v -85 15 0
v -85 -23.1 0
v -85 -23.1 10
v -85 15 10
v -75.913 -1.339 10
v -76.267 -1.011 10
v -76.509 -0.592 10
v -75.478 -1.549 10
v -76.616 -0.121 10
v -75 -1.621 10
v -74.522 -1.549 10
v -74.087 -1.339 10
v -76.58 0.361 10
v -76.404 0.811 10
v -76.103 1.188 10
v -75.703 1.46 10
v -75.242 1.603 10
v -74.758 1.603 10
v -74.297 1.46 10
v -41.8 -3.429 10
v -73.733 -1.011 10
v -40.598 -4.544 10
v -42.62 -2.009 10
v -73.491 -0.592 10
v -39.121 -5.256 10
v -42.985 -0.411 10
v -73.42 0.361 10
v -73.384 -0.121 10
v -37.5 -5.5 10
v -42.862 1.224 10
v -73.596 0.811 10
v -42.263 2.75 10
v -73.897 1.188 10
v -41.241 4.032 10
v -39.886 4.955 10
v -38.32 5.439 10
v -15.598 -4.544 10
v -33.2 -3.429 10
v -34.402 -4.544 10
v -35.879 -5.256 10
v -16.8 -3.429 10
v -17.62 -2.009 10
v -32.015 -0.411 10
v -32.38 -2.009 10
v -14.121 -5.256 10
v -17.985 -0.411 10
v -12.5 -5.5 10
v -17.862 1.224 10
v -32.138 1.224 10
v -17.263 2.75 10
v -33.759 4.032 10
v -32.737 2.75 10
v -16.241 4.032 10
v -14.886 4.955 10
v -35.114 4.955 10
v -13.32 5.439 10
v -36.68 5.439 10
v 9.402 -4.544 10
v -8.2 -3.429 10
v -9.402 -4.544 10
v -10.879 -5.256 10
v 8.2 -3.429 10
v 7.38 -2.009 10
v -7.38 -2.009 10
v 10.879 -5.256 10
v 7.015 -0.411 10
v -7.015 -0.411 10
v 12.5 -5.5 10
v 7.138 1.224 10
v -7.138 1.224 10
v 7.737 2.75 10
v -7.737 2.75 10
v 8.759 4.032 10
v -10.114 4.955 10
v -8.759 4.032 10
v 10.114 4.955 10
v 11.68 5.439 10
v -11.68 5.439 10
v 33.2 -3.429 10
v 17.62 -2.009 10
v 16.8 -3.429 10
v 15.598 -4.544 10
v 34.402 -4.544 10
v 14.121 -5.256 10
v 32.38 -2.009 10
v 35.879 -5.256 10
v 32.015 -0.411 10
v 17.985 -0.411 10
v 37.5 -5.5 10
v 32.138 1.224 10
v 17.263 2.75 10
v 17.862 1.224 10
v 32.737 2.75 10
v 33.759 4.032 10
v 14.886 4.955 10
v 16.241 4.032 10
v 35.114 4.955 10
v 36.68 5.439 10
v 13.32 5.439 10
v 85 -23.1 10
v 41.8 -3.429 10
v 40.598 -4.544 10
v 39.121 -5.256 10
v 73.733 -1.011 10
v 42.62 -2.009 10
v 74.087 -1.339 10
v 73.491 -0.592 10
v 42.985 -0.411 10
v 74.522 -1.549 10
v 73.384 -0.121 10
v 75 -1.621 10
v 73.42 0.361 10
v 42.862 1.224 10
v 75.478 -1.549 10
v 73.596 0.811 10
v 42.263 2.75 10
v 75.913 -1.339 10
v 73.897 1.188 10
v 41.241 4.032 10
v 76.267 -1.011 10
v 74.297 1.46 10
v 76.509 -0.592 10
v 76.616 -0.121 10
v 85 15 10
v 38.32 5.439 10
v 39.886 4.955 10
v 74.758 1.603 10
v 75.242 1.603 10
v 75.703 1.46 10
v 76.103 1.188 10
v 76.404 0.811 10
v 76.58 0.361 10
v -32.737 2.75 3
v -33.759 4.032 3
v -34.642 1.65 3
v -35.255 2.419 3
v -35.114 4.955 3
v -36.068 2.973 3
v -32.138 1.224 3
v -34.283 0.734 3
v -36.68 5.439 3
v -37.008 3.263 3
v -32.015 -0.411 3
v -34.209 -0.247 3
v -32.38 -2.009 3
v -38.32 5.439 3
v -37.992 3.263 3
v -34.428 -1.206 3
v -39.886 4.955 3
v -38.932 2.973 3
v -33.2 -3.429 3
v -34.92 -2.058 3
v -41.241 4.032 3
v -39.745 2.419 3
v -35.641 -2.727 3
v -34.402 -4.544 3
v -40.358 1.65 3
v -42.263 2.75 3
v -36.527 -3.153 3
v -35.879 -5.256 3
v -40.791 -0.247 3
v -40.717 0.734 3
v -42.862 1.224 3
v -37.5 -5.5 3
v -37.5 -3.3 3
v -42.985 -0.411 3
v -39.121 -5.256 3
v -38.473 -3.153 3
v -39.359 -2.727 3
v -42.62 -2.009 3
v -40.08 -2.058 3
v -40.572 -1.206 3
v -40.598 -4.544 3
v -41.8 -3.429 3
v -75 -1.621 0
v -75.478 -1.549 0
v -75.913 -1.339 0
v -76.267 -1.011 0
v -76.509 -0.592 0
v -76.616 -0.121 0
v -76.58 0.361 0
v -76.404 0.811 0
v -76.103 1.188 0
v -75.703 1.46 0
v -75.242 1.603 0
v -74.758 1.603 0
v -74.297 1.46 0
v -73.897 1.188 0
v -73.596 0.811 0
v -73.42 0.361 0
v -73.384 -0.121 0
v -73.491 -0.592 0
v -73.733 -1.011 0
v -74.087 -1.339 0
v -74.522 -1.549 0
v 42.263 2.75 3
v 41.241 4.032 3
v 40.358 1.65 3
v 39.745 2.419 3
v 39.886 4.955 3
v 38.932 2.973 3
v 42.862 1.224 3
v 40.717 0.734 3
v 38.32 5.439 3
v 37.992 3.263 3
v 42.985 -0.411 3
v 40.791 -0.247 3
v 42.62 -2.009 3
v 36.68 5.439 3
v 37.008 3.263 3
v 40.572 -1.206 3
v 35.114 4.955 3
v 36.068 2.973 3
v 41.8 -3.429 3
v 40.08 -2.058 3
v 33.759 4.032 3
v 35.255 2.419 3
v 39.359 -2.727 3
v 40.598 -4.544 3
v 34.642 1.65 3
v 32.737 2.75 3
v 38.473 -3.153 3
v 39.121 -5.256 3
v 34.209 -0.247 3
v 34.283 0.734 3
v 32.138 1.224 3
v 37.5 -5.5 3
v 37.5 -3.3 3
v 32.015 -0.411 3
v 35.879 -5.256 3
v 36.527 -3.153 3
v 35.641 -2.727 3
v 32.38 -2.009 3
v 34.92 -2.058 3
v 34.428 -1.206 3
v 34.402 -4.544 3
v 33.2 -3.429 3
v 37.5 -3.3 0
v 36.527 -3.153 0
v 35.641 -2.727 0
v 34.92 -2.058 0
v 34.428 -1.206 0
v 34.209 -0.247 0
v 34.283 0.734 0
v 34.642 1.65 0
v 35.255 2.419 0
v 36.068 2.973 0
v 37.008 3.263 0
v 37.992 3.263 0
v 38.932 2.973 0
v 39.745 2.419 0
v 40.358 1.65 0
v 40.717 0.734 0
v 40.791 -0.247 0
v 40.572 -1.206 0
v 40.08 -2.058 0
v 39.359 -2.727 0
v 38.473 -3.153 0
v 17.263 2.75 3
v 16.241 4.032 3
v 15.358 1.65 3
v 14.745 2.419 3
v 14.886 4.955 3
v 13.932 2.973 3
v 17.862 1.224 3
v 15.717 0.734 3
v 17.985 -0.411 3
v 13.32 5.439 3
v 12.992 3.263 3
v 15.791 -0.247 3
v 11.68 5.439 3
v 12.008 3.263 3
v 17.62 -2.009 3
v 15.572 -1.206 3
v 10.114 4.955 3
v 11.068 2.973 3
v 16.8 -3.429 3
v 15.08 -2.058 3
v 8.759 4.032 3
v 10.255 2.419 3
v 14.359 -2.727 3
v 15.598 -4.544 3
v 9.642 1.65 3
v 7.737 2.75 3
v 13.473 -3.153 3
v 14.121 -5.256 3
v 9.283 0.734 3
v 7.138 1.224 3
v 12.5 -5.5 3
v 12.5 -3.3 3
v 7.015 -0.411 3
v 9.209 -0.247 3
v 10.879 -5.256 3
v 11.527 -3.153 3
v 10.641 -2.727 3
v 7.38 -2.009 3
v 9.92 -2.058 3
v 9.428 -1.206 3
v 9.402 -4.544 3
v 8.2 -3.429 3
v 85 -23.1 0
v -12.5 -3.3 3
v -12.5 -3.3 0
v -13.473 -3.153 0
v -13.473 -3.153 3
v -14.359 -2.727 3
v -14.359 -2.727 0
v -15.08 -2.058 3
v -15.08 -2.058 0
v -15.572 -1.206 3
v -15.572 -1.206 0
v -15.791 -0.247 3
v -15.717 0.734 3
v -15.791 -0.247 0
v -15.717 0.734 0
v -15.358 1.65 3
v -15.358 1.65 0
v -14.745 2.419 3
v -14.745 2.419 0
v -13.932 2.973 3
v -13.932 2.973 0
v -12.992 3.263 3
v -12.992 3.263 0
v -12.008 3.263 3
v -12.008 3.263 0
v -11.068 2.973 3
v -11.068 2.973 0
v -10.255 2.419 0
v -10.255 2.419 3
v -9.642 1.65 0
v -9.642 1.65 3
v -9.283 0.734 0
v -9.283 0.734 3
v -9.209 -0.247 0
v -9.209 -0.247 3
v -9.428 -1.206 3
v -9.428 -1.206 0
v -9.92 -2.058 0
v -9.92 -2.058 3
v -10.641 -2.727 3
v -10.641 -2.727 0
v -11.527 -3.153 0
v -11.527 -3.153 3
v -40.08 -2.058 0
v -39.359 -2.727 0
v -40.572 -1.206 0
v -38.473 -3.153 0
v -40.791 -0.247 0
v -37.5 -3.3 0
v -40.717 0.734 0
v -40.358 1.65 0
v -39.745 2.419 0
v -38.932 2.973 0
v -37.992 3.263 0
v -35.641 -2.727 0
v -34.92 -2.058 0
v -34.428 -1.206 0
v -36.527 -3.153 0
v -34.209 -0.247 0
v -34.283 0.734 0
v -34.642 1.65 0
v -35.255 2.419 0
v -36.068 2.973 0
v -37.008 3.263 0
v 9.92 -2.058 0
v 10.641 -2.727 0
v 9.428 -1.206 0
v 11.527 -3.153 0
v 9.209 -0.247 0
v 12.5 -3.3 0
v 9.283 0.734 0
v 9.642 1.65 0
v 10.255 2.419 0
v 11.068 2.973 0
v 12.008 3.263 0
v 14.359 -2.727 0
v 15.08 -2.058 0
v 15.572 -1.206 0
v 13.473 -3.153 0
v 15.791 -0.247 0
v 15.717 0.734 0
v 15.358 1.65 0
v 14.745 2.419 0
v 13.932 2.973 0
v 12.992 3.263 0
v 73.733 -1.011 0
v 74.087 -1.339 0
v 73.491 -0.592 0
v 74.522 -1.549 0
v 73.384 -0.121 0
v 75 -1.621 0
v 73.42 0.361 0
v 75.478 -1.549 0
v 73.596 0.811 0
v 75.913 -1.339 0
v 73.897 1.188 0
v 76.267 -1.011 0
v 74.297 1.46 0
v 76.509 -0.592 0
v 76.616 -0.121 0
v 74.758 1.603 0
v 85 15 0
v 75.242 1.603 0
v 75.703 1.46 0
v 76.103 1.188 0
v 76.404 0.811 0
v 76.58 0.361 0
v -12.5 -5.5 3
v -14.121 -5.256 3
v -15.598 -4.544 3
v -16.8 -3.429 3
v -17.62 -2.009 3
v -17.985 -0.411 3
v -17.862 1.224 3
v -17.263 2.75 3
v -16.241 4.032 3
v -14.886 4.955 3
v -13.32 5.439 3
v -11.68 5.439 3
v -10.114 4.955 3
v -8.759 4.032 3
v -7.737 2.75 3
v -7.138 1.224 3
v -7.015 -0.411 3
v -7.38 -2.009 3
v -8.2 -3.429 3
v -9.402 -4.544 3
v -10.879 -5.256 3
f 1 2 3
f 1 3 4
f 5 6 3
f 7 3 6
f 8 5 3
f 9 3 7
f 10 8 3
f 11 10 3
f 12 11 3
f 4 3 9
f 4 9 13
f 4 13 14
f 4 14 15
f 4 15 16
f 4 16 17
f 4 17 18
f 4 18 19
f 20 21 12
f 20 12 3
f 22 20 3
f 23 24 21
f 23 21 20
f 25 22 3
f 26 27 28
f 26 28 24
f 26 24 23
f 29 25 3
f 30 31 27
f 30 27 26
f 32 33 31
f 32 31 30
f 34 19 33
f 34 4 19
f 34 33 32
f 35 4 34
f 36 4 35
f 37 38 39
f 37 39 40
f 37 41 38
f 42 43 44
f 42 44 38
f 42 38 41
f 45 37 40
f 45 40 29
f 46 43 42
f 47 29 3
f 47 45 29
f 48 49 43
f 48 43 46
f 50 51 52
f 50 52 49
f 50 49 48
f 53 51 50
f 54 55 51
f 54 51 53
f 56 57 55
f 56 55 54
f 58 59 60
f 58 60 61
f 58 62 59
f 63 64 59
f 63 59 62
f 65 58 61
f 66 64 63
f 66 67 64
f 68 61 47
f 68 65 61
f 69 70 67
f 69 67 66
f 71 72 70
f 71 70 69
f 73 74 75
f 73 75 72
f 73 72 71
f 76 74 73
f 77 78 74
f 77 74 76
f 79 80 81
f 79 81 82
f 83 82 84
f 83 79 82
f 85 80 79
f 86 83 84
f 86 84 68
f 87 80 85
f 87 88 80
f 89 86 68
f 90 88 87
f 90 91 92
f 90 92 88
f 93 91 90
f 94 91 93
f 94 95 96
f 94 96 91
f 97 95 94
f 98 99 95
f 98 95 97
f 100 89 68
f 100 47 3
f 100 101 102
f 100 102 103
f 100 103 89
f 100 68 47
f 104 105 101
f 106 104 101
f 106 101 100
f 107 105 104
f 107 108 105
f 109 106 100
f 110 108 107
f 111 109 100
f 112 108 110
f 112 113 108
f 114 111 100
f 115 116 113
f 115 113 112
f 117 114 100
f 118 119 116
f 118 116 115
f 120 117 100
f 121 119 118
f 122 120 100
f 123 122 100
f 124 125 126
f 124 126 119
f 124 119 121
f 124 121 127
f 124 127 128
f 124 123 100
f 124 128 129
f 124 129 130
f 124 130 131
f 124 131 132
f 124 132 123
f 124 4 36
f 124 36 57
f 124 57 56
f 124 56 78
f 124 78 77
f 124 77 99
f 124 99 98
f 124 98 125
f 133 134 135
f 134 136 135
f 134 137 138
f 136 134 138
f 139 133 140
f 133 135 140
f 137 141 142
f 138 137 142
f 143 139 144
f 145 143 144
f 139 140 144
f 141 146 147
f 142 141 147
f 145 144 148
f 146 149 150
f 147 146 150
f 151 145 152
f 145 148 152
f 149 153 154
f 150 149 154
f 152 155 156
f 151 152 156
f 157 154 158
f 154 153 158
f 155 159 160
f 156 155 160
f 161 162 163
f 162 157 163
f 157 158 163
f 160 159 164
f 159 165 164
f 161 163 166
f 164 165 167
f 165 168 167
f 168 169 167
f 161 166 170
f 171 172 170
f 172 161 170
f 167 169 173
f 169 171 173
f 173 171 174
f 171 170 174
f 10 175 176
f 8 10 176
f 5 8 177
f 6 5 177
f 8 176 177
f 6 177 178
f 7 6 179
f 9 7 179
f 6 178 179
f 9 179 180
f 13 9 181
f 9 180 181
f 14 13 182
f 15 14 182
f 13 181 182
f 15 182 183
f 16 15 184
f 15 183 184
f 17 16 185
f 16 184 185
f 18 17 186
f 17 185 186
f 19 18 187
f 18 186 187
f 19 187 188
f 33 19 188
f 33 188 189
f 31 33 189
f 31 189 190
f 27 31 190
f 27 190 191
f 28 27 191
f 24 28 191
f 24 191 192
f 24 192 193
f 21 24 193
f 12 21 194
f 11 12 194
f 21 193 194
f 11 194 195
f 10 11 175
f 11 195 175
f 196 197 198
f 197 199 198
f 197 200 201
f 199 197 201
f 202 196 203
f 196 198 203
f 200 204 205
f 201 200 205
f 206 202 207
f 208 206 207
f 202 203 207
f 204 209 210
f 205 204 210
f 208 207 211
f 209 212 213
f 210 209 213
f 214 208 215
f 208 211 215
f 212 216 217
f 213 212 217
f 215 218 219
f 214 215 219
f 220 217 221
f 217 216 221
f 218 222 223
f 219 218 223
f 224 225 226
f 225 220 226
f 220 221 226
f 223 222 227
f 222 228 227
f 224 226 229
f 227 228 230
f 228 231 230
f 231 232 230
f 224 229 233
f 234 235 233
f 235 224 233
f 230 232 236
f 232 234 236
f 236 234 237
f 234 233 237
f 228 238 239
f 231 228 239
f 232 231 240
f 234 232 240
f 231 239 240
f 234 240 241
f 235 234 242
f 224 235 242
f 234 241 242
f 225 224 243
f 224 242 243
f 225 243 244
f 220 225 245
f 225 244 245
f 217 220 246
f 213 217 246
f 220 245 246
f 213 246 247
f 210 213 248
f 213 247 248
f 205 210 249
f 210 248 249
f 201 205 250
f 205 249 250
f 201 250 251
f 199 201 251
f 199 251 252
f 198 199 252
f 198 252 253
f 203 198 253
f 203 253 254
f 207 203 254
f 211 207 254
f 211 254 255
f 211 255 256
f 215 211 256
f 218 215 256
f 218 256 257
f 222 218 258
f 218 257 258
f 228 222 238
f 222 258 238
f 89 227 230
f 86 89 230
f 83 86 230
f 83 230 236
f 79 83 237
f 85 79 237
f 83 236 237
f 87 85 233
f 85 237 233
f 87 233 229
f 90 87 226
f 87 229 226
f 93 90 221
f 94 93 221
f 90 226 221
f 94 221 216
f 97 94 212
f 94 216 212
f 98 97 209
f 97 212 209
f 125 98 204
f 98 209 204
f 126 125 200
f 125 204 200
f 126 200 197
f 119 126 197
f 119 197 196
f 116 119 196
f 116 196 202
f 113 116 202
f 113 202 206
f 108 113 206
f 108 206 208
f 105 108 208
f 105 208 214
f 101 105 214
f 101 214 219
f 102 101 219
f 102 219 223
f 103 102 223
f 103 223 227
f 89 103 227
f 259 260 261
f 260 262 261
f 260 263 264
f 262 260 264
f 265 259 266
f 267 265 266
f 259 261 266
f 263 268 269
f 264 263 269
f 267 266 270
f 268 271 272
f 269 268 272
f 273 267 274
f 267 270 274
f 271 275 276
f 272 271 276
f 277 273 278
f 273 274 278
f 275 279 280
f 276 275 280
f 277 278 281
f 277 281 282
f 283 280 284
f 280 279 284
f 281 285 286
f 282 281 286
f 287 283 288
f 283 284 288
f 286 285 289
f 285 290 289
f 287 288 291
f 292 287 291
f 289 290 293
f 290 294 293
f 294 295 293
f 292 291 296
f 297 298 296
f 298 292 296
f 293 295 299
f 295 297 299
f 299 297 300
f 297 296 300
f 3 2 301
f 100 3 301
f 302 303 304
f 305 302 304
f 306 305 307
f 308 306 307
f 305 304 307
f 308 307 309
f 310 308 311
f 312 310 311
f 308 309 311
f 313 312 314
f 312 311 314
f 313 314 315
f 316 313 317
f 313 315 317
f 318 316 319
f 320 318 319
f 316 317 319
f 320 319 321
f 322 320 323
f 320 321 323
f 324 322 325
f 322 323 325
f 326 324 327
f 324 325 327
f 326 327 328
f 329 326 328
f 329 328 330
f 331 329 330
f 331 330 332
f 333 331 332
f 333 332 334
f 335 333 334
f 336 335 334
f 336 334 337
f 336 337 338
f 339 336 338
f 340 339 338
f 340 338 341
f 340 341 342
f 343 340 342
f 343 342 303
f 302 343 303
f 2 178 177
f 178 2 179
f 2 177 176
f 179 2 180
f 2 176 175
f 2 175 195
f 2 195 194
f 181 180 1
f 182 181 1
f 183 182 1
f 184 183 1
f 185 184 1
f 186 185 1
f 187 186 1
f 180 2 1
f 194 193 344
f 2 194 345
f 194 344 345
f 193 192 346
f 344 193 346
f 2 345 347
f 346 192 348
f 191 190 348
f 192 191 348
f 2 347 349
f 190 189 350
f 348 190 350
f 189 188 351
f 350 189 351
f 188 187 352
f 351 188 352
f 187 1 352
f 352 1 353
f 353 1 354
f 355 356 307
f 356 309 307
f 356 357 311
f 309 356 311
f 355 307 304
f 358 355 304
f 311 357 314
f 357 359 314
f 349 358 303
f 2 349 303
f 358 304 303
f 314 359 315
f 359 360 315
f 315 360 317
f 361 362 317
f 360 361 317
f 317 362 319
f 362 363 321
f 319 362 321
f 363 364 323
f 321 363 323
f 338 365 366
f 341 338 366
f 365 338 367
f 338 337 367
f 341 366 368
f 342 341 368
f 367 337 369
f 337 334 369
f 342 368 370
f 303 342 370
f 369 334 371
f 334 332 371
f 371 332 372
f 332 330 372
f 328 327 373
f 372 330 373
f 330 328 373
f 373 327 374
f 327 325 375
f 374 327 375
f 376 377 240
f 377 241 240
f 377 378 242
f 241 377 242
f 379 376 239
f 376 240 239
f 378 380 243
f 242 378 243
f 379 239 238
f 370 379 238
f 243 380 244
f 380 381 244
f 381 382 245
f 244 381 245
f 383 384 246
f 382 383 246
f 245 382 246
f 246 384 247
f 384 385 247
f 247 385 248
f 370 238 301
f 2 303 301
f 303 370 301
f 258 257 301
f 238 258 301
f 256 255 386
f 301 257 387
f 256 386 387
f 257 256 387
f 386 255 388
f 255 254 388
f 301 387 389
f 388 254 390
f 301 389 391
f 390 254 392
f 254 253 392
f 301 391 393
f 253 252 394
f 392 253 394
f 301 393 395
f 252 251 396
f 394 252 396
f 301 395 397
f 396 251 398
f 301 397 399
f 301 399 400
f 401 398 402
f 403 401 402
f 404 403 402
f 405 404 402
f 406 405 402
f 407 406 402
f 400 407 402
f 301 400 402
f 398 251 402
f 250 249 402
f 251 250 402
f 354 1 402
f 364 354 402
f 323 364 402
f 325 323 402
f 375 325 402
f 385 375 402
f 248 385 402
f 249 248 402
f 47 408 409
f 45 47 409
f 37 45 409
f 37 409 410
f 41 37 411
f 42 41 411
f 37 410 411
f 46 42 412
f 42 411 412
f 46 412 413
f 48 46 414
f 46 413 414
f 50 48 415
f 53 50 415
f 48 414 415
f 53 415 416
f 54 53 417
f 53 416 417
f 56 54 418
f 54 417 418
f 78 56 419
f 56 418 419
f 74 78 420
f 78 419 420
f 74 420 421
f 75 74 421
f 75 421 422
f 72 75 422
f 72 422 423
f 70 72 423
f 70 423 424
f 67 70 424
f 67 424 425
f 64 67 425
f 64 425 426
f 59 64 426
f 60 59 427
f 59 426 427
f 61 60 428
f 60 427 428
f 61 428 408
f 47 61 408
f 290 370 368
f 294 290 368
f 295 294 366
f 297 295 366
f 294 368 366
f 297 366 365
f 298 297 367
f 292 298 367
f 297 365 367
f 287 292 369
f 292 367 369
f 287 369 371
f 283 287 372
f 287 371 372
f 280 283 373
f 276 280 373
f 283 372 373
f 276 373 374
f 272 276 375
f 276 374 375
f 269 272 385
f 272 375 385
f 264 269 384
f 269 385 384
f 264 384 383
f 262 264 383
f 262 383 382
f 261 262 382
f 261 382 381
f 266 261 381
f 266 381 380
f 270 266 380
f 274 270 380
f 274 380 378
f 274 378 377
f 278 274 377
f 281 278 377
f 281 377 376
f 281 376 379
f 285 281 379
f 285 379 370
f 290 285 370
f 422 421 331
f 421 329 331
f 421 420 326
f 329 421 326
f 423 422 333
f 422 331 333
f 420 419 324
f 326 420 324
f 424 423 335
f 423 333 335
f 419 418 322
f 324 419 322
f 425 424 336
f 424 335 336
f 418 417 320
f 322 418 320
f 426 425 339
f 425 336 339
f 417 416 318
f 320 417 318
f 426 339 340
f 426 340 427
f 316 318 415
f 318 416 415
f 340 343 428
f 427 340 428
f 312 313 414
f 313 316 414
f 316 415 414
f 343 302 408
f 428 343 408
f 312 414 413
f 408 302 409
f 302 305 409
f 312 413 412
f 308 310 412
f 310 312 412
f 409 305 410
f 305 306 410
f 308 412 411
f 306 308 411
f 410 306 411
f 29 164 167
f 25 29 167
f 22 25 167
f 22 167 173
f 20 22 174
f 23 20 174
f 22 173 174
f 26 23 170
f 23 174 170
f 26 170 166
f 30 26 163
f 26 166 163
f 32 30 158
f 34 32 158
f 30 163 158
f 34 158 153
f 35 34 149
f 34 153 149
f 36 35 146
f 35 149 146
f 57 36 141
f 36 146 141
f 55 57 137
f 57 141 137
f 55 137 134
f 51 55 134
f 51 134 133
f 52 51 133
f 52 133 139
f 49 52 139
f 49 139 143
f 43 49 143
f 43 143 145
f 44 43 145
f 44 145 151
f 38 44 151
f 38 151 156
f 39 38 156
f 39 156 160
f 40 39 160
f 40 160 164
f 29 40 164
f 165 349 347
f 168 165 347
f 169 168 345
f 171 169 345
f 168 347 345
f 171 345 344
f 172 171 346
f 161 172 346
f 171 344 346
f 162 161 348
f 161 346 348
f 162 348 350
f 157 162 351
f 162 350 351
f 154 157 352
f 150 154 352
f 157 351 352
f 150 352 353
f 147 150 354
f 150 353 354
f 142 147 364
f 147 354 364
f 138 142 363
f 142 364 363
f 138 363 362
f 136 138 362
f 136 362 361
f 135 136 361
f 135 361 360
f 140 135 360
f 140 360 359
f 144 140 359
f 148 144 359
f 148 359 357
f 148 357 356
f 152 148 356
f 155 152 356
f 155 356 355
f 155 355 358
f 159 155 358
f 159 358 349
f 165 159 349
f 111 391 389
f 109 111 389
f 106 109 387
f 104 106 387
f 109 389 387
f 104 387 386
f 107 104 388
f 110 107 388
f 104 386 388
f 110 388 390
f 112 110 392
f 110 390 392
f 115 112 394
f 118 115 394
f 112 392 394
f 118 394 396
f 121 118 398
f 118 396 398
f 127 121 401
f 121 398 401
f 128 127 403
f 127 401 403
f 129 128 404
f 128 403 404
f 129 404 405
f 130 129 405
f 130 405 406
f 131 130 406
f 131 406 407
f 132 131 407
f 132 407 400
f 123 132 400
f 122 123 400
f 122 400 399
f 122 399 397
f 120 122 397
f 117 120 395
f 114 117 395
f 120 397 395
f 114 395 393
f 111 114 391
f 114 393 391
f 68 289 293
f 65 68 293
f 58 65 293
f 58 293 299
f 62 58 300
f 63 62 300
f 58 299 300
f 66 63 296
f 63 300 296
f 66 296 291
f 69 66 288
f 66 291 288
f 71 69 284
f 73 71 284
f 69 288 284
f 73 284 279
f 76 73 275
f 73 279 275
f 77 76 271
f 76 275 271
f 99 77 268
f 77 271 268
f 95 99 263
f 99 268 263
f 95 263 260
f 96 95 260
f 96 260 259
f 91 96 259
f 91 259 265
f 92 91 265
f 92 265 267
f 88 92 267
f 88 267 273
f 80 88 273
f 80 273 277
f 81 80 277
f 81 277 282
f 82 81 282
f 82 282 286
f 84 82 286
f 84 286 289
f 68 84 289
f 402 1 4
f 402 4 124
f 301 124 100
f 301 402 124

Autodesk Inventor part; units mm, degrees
ref_plane "YZ Plane" through (0, 0, 0) normal (1, 0, 0) x (0, 1, 0)
ref_plane "XZ Plane" through (0, 0, 0) normal (0, 1, 0) x (-1, 0, 0)
ref_plane "XY Plane" through (0, 0, 0) normal (0, 0, 1) x (1, 0, 0)
sketch "Sketch1" plane through (0, 0, 0) normal (0, 0, 1) x (1, 0, 0)
  line L0 (-85, 15) -> (85, 15)
  line L1 (85, 15) -> (85, -15)
  line L2 (85, -15) -> (-85, -15)
  line L3 (-85, -15) -> (-85, 15)
  line L4 (85, -15) -> (-85, -15)
  line L5 (-85, -15) -> (-85, -23.1)
  line L6 (-85, -23.1) -> (85, -23.1)
  line L7 (85, -23.1) -> (85, -15)
  point P0 (0, 0)
  dimension "d0" = 30
  dimension "d1" = 170
  dimension "d2" = 85
  dimension "d3" = 15
  dimension "d34" = 8.1
  dimension "d35" = 170
extrude "Extrusion1" add sketch "Sketch1" along normal blind 10
sketch "Sketch2" plane through (0, 0, 10) normal (0, 0, 1) x (1, 0, 0)
  point P0 (0, 0)
  point P1 (-37.5, 0)
  point P2 (-12.5, 0)
  point P3 (12.5, 0)
  point P4 (37.5, 0)
  dimension "d30" = 25
  dimension "d31" = 25
  dimension "d32" = 25
  dimension "d33" = 12.5
hole "Hole1" at (-37.5, 0, 10) at (-12.5, 0, 10) at (12.5, 0, 10) at (37.5, 0, 10) direction (0, 0, -1) diameter 6.6 end through all counterbore diameter 11 counterbore depth 7 clearance for "Hex Head Cap Screw ISO 24017" size "M6" standard "ISO"
sketch "Sketch3" plane through (0, 0, 10) normal (0, 0, 1) x (1, 0, 0)
  point P0 (0, 0)
  point P1 (75, 0)
  point P2 (-75, 0)
  dimension "d16" = 150
  dimension "d17" = 75
hole "Hole2" at (75, 0, 10) at (-75, 0, 10) direction (0, 0, -1) diameter 3.242 end through all thread size "M4x0.7" class "6H" standard "ISO Metric profile"
equation "\"d2\" = 0.5 * d1"
equation "\"d3\" = 0.5 * d0"
equation "\"d35\" = d1"
equation "\"d33\" = 0.5 * d31"
equation "\"d17\" = 0.5 * d16"
properties part number "zStackJackAttach_piece2"
